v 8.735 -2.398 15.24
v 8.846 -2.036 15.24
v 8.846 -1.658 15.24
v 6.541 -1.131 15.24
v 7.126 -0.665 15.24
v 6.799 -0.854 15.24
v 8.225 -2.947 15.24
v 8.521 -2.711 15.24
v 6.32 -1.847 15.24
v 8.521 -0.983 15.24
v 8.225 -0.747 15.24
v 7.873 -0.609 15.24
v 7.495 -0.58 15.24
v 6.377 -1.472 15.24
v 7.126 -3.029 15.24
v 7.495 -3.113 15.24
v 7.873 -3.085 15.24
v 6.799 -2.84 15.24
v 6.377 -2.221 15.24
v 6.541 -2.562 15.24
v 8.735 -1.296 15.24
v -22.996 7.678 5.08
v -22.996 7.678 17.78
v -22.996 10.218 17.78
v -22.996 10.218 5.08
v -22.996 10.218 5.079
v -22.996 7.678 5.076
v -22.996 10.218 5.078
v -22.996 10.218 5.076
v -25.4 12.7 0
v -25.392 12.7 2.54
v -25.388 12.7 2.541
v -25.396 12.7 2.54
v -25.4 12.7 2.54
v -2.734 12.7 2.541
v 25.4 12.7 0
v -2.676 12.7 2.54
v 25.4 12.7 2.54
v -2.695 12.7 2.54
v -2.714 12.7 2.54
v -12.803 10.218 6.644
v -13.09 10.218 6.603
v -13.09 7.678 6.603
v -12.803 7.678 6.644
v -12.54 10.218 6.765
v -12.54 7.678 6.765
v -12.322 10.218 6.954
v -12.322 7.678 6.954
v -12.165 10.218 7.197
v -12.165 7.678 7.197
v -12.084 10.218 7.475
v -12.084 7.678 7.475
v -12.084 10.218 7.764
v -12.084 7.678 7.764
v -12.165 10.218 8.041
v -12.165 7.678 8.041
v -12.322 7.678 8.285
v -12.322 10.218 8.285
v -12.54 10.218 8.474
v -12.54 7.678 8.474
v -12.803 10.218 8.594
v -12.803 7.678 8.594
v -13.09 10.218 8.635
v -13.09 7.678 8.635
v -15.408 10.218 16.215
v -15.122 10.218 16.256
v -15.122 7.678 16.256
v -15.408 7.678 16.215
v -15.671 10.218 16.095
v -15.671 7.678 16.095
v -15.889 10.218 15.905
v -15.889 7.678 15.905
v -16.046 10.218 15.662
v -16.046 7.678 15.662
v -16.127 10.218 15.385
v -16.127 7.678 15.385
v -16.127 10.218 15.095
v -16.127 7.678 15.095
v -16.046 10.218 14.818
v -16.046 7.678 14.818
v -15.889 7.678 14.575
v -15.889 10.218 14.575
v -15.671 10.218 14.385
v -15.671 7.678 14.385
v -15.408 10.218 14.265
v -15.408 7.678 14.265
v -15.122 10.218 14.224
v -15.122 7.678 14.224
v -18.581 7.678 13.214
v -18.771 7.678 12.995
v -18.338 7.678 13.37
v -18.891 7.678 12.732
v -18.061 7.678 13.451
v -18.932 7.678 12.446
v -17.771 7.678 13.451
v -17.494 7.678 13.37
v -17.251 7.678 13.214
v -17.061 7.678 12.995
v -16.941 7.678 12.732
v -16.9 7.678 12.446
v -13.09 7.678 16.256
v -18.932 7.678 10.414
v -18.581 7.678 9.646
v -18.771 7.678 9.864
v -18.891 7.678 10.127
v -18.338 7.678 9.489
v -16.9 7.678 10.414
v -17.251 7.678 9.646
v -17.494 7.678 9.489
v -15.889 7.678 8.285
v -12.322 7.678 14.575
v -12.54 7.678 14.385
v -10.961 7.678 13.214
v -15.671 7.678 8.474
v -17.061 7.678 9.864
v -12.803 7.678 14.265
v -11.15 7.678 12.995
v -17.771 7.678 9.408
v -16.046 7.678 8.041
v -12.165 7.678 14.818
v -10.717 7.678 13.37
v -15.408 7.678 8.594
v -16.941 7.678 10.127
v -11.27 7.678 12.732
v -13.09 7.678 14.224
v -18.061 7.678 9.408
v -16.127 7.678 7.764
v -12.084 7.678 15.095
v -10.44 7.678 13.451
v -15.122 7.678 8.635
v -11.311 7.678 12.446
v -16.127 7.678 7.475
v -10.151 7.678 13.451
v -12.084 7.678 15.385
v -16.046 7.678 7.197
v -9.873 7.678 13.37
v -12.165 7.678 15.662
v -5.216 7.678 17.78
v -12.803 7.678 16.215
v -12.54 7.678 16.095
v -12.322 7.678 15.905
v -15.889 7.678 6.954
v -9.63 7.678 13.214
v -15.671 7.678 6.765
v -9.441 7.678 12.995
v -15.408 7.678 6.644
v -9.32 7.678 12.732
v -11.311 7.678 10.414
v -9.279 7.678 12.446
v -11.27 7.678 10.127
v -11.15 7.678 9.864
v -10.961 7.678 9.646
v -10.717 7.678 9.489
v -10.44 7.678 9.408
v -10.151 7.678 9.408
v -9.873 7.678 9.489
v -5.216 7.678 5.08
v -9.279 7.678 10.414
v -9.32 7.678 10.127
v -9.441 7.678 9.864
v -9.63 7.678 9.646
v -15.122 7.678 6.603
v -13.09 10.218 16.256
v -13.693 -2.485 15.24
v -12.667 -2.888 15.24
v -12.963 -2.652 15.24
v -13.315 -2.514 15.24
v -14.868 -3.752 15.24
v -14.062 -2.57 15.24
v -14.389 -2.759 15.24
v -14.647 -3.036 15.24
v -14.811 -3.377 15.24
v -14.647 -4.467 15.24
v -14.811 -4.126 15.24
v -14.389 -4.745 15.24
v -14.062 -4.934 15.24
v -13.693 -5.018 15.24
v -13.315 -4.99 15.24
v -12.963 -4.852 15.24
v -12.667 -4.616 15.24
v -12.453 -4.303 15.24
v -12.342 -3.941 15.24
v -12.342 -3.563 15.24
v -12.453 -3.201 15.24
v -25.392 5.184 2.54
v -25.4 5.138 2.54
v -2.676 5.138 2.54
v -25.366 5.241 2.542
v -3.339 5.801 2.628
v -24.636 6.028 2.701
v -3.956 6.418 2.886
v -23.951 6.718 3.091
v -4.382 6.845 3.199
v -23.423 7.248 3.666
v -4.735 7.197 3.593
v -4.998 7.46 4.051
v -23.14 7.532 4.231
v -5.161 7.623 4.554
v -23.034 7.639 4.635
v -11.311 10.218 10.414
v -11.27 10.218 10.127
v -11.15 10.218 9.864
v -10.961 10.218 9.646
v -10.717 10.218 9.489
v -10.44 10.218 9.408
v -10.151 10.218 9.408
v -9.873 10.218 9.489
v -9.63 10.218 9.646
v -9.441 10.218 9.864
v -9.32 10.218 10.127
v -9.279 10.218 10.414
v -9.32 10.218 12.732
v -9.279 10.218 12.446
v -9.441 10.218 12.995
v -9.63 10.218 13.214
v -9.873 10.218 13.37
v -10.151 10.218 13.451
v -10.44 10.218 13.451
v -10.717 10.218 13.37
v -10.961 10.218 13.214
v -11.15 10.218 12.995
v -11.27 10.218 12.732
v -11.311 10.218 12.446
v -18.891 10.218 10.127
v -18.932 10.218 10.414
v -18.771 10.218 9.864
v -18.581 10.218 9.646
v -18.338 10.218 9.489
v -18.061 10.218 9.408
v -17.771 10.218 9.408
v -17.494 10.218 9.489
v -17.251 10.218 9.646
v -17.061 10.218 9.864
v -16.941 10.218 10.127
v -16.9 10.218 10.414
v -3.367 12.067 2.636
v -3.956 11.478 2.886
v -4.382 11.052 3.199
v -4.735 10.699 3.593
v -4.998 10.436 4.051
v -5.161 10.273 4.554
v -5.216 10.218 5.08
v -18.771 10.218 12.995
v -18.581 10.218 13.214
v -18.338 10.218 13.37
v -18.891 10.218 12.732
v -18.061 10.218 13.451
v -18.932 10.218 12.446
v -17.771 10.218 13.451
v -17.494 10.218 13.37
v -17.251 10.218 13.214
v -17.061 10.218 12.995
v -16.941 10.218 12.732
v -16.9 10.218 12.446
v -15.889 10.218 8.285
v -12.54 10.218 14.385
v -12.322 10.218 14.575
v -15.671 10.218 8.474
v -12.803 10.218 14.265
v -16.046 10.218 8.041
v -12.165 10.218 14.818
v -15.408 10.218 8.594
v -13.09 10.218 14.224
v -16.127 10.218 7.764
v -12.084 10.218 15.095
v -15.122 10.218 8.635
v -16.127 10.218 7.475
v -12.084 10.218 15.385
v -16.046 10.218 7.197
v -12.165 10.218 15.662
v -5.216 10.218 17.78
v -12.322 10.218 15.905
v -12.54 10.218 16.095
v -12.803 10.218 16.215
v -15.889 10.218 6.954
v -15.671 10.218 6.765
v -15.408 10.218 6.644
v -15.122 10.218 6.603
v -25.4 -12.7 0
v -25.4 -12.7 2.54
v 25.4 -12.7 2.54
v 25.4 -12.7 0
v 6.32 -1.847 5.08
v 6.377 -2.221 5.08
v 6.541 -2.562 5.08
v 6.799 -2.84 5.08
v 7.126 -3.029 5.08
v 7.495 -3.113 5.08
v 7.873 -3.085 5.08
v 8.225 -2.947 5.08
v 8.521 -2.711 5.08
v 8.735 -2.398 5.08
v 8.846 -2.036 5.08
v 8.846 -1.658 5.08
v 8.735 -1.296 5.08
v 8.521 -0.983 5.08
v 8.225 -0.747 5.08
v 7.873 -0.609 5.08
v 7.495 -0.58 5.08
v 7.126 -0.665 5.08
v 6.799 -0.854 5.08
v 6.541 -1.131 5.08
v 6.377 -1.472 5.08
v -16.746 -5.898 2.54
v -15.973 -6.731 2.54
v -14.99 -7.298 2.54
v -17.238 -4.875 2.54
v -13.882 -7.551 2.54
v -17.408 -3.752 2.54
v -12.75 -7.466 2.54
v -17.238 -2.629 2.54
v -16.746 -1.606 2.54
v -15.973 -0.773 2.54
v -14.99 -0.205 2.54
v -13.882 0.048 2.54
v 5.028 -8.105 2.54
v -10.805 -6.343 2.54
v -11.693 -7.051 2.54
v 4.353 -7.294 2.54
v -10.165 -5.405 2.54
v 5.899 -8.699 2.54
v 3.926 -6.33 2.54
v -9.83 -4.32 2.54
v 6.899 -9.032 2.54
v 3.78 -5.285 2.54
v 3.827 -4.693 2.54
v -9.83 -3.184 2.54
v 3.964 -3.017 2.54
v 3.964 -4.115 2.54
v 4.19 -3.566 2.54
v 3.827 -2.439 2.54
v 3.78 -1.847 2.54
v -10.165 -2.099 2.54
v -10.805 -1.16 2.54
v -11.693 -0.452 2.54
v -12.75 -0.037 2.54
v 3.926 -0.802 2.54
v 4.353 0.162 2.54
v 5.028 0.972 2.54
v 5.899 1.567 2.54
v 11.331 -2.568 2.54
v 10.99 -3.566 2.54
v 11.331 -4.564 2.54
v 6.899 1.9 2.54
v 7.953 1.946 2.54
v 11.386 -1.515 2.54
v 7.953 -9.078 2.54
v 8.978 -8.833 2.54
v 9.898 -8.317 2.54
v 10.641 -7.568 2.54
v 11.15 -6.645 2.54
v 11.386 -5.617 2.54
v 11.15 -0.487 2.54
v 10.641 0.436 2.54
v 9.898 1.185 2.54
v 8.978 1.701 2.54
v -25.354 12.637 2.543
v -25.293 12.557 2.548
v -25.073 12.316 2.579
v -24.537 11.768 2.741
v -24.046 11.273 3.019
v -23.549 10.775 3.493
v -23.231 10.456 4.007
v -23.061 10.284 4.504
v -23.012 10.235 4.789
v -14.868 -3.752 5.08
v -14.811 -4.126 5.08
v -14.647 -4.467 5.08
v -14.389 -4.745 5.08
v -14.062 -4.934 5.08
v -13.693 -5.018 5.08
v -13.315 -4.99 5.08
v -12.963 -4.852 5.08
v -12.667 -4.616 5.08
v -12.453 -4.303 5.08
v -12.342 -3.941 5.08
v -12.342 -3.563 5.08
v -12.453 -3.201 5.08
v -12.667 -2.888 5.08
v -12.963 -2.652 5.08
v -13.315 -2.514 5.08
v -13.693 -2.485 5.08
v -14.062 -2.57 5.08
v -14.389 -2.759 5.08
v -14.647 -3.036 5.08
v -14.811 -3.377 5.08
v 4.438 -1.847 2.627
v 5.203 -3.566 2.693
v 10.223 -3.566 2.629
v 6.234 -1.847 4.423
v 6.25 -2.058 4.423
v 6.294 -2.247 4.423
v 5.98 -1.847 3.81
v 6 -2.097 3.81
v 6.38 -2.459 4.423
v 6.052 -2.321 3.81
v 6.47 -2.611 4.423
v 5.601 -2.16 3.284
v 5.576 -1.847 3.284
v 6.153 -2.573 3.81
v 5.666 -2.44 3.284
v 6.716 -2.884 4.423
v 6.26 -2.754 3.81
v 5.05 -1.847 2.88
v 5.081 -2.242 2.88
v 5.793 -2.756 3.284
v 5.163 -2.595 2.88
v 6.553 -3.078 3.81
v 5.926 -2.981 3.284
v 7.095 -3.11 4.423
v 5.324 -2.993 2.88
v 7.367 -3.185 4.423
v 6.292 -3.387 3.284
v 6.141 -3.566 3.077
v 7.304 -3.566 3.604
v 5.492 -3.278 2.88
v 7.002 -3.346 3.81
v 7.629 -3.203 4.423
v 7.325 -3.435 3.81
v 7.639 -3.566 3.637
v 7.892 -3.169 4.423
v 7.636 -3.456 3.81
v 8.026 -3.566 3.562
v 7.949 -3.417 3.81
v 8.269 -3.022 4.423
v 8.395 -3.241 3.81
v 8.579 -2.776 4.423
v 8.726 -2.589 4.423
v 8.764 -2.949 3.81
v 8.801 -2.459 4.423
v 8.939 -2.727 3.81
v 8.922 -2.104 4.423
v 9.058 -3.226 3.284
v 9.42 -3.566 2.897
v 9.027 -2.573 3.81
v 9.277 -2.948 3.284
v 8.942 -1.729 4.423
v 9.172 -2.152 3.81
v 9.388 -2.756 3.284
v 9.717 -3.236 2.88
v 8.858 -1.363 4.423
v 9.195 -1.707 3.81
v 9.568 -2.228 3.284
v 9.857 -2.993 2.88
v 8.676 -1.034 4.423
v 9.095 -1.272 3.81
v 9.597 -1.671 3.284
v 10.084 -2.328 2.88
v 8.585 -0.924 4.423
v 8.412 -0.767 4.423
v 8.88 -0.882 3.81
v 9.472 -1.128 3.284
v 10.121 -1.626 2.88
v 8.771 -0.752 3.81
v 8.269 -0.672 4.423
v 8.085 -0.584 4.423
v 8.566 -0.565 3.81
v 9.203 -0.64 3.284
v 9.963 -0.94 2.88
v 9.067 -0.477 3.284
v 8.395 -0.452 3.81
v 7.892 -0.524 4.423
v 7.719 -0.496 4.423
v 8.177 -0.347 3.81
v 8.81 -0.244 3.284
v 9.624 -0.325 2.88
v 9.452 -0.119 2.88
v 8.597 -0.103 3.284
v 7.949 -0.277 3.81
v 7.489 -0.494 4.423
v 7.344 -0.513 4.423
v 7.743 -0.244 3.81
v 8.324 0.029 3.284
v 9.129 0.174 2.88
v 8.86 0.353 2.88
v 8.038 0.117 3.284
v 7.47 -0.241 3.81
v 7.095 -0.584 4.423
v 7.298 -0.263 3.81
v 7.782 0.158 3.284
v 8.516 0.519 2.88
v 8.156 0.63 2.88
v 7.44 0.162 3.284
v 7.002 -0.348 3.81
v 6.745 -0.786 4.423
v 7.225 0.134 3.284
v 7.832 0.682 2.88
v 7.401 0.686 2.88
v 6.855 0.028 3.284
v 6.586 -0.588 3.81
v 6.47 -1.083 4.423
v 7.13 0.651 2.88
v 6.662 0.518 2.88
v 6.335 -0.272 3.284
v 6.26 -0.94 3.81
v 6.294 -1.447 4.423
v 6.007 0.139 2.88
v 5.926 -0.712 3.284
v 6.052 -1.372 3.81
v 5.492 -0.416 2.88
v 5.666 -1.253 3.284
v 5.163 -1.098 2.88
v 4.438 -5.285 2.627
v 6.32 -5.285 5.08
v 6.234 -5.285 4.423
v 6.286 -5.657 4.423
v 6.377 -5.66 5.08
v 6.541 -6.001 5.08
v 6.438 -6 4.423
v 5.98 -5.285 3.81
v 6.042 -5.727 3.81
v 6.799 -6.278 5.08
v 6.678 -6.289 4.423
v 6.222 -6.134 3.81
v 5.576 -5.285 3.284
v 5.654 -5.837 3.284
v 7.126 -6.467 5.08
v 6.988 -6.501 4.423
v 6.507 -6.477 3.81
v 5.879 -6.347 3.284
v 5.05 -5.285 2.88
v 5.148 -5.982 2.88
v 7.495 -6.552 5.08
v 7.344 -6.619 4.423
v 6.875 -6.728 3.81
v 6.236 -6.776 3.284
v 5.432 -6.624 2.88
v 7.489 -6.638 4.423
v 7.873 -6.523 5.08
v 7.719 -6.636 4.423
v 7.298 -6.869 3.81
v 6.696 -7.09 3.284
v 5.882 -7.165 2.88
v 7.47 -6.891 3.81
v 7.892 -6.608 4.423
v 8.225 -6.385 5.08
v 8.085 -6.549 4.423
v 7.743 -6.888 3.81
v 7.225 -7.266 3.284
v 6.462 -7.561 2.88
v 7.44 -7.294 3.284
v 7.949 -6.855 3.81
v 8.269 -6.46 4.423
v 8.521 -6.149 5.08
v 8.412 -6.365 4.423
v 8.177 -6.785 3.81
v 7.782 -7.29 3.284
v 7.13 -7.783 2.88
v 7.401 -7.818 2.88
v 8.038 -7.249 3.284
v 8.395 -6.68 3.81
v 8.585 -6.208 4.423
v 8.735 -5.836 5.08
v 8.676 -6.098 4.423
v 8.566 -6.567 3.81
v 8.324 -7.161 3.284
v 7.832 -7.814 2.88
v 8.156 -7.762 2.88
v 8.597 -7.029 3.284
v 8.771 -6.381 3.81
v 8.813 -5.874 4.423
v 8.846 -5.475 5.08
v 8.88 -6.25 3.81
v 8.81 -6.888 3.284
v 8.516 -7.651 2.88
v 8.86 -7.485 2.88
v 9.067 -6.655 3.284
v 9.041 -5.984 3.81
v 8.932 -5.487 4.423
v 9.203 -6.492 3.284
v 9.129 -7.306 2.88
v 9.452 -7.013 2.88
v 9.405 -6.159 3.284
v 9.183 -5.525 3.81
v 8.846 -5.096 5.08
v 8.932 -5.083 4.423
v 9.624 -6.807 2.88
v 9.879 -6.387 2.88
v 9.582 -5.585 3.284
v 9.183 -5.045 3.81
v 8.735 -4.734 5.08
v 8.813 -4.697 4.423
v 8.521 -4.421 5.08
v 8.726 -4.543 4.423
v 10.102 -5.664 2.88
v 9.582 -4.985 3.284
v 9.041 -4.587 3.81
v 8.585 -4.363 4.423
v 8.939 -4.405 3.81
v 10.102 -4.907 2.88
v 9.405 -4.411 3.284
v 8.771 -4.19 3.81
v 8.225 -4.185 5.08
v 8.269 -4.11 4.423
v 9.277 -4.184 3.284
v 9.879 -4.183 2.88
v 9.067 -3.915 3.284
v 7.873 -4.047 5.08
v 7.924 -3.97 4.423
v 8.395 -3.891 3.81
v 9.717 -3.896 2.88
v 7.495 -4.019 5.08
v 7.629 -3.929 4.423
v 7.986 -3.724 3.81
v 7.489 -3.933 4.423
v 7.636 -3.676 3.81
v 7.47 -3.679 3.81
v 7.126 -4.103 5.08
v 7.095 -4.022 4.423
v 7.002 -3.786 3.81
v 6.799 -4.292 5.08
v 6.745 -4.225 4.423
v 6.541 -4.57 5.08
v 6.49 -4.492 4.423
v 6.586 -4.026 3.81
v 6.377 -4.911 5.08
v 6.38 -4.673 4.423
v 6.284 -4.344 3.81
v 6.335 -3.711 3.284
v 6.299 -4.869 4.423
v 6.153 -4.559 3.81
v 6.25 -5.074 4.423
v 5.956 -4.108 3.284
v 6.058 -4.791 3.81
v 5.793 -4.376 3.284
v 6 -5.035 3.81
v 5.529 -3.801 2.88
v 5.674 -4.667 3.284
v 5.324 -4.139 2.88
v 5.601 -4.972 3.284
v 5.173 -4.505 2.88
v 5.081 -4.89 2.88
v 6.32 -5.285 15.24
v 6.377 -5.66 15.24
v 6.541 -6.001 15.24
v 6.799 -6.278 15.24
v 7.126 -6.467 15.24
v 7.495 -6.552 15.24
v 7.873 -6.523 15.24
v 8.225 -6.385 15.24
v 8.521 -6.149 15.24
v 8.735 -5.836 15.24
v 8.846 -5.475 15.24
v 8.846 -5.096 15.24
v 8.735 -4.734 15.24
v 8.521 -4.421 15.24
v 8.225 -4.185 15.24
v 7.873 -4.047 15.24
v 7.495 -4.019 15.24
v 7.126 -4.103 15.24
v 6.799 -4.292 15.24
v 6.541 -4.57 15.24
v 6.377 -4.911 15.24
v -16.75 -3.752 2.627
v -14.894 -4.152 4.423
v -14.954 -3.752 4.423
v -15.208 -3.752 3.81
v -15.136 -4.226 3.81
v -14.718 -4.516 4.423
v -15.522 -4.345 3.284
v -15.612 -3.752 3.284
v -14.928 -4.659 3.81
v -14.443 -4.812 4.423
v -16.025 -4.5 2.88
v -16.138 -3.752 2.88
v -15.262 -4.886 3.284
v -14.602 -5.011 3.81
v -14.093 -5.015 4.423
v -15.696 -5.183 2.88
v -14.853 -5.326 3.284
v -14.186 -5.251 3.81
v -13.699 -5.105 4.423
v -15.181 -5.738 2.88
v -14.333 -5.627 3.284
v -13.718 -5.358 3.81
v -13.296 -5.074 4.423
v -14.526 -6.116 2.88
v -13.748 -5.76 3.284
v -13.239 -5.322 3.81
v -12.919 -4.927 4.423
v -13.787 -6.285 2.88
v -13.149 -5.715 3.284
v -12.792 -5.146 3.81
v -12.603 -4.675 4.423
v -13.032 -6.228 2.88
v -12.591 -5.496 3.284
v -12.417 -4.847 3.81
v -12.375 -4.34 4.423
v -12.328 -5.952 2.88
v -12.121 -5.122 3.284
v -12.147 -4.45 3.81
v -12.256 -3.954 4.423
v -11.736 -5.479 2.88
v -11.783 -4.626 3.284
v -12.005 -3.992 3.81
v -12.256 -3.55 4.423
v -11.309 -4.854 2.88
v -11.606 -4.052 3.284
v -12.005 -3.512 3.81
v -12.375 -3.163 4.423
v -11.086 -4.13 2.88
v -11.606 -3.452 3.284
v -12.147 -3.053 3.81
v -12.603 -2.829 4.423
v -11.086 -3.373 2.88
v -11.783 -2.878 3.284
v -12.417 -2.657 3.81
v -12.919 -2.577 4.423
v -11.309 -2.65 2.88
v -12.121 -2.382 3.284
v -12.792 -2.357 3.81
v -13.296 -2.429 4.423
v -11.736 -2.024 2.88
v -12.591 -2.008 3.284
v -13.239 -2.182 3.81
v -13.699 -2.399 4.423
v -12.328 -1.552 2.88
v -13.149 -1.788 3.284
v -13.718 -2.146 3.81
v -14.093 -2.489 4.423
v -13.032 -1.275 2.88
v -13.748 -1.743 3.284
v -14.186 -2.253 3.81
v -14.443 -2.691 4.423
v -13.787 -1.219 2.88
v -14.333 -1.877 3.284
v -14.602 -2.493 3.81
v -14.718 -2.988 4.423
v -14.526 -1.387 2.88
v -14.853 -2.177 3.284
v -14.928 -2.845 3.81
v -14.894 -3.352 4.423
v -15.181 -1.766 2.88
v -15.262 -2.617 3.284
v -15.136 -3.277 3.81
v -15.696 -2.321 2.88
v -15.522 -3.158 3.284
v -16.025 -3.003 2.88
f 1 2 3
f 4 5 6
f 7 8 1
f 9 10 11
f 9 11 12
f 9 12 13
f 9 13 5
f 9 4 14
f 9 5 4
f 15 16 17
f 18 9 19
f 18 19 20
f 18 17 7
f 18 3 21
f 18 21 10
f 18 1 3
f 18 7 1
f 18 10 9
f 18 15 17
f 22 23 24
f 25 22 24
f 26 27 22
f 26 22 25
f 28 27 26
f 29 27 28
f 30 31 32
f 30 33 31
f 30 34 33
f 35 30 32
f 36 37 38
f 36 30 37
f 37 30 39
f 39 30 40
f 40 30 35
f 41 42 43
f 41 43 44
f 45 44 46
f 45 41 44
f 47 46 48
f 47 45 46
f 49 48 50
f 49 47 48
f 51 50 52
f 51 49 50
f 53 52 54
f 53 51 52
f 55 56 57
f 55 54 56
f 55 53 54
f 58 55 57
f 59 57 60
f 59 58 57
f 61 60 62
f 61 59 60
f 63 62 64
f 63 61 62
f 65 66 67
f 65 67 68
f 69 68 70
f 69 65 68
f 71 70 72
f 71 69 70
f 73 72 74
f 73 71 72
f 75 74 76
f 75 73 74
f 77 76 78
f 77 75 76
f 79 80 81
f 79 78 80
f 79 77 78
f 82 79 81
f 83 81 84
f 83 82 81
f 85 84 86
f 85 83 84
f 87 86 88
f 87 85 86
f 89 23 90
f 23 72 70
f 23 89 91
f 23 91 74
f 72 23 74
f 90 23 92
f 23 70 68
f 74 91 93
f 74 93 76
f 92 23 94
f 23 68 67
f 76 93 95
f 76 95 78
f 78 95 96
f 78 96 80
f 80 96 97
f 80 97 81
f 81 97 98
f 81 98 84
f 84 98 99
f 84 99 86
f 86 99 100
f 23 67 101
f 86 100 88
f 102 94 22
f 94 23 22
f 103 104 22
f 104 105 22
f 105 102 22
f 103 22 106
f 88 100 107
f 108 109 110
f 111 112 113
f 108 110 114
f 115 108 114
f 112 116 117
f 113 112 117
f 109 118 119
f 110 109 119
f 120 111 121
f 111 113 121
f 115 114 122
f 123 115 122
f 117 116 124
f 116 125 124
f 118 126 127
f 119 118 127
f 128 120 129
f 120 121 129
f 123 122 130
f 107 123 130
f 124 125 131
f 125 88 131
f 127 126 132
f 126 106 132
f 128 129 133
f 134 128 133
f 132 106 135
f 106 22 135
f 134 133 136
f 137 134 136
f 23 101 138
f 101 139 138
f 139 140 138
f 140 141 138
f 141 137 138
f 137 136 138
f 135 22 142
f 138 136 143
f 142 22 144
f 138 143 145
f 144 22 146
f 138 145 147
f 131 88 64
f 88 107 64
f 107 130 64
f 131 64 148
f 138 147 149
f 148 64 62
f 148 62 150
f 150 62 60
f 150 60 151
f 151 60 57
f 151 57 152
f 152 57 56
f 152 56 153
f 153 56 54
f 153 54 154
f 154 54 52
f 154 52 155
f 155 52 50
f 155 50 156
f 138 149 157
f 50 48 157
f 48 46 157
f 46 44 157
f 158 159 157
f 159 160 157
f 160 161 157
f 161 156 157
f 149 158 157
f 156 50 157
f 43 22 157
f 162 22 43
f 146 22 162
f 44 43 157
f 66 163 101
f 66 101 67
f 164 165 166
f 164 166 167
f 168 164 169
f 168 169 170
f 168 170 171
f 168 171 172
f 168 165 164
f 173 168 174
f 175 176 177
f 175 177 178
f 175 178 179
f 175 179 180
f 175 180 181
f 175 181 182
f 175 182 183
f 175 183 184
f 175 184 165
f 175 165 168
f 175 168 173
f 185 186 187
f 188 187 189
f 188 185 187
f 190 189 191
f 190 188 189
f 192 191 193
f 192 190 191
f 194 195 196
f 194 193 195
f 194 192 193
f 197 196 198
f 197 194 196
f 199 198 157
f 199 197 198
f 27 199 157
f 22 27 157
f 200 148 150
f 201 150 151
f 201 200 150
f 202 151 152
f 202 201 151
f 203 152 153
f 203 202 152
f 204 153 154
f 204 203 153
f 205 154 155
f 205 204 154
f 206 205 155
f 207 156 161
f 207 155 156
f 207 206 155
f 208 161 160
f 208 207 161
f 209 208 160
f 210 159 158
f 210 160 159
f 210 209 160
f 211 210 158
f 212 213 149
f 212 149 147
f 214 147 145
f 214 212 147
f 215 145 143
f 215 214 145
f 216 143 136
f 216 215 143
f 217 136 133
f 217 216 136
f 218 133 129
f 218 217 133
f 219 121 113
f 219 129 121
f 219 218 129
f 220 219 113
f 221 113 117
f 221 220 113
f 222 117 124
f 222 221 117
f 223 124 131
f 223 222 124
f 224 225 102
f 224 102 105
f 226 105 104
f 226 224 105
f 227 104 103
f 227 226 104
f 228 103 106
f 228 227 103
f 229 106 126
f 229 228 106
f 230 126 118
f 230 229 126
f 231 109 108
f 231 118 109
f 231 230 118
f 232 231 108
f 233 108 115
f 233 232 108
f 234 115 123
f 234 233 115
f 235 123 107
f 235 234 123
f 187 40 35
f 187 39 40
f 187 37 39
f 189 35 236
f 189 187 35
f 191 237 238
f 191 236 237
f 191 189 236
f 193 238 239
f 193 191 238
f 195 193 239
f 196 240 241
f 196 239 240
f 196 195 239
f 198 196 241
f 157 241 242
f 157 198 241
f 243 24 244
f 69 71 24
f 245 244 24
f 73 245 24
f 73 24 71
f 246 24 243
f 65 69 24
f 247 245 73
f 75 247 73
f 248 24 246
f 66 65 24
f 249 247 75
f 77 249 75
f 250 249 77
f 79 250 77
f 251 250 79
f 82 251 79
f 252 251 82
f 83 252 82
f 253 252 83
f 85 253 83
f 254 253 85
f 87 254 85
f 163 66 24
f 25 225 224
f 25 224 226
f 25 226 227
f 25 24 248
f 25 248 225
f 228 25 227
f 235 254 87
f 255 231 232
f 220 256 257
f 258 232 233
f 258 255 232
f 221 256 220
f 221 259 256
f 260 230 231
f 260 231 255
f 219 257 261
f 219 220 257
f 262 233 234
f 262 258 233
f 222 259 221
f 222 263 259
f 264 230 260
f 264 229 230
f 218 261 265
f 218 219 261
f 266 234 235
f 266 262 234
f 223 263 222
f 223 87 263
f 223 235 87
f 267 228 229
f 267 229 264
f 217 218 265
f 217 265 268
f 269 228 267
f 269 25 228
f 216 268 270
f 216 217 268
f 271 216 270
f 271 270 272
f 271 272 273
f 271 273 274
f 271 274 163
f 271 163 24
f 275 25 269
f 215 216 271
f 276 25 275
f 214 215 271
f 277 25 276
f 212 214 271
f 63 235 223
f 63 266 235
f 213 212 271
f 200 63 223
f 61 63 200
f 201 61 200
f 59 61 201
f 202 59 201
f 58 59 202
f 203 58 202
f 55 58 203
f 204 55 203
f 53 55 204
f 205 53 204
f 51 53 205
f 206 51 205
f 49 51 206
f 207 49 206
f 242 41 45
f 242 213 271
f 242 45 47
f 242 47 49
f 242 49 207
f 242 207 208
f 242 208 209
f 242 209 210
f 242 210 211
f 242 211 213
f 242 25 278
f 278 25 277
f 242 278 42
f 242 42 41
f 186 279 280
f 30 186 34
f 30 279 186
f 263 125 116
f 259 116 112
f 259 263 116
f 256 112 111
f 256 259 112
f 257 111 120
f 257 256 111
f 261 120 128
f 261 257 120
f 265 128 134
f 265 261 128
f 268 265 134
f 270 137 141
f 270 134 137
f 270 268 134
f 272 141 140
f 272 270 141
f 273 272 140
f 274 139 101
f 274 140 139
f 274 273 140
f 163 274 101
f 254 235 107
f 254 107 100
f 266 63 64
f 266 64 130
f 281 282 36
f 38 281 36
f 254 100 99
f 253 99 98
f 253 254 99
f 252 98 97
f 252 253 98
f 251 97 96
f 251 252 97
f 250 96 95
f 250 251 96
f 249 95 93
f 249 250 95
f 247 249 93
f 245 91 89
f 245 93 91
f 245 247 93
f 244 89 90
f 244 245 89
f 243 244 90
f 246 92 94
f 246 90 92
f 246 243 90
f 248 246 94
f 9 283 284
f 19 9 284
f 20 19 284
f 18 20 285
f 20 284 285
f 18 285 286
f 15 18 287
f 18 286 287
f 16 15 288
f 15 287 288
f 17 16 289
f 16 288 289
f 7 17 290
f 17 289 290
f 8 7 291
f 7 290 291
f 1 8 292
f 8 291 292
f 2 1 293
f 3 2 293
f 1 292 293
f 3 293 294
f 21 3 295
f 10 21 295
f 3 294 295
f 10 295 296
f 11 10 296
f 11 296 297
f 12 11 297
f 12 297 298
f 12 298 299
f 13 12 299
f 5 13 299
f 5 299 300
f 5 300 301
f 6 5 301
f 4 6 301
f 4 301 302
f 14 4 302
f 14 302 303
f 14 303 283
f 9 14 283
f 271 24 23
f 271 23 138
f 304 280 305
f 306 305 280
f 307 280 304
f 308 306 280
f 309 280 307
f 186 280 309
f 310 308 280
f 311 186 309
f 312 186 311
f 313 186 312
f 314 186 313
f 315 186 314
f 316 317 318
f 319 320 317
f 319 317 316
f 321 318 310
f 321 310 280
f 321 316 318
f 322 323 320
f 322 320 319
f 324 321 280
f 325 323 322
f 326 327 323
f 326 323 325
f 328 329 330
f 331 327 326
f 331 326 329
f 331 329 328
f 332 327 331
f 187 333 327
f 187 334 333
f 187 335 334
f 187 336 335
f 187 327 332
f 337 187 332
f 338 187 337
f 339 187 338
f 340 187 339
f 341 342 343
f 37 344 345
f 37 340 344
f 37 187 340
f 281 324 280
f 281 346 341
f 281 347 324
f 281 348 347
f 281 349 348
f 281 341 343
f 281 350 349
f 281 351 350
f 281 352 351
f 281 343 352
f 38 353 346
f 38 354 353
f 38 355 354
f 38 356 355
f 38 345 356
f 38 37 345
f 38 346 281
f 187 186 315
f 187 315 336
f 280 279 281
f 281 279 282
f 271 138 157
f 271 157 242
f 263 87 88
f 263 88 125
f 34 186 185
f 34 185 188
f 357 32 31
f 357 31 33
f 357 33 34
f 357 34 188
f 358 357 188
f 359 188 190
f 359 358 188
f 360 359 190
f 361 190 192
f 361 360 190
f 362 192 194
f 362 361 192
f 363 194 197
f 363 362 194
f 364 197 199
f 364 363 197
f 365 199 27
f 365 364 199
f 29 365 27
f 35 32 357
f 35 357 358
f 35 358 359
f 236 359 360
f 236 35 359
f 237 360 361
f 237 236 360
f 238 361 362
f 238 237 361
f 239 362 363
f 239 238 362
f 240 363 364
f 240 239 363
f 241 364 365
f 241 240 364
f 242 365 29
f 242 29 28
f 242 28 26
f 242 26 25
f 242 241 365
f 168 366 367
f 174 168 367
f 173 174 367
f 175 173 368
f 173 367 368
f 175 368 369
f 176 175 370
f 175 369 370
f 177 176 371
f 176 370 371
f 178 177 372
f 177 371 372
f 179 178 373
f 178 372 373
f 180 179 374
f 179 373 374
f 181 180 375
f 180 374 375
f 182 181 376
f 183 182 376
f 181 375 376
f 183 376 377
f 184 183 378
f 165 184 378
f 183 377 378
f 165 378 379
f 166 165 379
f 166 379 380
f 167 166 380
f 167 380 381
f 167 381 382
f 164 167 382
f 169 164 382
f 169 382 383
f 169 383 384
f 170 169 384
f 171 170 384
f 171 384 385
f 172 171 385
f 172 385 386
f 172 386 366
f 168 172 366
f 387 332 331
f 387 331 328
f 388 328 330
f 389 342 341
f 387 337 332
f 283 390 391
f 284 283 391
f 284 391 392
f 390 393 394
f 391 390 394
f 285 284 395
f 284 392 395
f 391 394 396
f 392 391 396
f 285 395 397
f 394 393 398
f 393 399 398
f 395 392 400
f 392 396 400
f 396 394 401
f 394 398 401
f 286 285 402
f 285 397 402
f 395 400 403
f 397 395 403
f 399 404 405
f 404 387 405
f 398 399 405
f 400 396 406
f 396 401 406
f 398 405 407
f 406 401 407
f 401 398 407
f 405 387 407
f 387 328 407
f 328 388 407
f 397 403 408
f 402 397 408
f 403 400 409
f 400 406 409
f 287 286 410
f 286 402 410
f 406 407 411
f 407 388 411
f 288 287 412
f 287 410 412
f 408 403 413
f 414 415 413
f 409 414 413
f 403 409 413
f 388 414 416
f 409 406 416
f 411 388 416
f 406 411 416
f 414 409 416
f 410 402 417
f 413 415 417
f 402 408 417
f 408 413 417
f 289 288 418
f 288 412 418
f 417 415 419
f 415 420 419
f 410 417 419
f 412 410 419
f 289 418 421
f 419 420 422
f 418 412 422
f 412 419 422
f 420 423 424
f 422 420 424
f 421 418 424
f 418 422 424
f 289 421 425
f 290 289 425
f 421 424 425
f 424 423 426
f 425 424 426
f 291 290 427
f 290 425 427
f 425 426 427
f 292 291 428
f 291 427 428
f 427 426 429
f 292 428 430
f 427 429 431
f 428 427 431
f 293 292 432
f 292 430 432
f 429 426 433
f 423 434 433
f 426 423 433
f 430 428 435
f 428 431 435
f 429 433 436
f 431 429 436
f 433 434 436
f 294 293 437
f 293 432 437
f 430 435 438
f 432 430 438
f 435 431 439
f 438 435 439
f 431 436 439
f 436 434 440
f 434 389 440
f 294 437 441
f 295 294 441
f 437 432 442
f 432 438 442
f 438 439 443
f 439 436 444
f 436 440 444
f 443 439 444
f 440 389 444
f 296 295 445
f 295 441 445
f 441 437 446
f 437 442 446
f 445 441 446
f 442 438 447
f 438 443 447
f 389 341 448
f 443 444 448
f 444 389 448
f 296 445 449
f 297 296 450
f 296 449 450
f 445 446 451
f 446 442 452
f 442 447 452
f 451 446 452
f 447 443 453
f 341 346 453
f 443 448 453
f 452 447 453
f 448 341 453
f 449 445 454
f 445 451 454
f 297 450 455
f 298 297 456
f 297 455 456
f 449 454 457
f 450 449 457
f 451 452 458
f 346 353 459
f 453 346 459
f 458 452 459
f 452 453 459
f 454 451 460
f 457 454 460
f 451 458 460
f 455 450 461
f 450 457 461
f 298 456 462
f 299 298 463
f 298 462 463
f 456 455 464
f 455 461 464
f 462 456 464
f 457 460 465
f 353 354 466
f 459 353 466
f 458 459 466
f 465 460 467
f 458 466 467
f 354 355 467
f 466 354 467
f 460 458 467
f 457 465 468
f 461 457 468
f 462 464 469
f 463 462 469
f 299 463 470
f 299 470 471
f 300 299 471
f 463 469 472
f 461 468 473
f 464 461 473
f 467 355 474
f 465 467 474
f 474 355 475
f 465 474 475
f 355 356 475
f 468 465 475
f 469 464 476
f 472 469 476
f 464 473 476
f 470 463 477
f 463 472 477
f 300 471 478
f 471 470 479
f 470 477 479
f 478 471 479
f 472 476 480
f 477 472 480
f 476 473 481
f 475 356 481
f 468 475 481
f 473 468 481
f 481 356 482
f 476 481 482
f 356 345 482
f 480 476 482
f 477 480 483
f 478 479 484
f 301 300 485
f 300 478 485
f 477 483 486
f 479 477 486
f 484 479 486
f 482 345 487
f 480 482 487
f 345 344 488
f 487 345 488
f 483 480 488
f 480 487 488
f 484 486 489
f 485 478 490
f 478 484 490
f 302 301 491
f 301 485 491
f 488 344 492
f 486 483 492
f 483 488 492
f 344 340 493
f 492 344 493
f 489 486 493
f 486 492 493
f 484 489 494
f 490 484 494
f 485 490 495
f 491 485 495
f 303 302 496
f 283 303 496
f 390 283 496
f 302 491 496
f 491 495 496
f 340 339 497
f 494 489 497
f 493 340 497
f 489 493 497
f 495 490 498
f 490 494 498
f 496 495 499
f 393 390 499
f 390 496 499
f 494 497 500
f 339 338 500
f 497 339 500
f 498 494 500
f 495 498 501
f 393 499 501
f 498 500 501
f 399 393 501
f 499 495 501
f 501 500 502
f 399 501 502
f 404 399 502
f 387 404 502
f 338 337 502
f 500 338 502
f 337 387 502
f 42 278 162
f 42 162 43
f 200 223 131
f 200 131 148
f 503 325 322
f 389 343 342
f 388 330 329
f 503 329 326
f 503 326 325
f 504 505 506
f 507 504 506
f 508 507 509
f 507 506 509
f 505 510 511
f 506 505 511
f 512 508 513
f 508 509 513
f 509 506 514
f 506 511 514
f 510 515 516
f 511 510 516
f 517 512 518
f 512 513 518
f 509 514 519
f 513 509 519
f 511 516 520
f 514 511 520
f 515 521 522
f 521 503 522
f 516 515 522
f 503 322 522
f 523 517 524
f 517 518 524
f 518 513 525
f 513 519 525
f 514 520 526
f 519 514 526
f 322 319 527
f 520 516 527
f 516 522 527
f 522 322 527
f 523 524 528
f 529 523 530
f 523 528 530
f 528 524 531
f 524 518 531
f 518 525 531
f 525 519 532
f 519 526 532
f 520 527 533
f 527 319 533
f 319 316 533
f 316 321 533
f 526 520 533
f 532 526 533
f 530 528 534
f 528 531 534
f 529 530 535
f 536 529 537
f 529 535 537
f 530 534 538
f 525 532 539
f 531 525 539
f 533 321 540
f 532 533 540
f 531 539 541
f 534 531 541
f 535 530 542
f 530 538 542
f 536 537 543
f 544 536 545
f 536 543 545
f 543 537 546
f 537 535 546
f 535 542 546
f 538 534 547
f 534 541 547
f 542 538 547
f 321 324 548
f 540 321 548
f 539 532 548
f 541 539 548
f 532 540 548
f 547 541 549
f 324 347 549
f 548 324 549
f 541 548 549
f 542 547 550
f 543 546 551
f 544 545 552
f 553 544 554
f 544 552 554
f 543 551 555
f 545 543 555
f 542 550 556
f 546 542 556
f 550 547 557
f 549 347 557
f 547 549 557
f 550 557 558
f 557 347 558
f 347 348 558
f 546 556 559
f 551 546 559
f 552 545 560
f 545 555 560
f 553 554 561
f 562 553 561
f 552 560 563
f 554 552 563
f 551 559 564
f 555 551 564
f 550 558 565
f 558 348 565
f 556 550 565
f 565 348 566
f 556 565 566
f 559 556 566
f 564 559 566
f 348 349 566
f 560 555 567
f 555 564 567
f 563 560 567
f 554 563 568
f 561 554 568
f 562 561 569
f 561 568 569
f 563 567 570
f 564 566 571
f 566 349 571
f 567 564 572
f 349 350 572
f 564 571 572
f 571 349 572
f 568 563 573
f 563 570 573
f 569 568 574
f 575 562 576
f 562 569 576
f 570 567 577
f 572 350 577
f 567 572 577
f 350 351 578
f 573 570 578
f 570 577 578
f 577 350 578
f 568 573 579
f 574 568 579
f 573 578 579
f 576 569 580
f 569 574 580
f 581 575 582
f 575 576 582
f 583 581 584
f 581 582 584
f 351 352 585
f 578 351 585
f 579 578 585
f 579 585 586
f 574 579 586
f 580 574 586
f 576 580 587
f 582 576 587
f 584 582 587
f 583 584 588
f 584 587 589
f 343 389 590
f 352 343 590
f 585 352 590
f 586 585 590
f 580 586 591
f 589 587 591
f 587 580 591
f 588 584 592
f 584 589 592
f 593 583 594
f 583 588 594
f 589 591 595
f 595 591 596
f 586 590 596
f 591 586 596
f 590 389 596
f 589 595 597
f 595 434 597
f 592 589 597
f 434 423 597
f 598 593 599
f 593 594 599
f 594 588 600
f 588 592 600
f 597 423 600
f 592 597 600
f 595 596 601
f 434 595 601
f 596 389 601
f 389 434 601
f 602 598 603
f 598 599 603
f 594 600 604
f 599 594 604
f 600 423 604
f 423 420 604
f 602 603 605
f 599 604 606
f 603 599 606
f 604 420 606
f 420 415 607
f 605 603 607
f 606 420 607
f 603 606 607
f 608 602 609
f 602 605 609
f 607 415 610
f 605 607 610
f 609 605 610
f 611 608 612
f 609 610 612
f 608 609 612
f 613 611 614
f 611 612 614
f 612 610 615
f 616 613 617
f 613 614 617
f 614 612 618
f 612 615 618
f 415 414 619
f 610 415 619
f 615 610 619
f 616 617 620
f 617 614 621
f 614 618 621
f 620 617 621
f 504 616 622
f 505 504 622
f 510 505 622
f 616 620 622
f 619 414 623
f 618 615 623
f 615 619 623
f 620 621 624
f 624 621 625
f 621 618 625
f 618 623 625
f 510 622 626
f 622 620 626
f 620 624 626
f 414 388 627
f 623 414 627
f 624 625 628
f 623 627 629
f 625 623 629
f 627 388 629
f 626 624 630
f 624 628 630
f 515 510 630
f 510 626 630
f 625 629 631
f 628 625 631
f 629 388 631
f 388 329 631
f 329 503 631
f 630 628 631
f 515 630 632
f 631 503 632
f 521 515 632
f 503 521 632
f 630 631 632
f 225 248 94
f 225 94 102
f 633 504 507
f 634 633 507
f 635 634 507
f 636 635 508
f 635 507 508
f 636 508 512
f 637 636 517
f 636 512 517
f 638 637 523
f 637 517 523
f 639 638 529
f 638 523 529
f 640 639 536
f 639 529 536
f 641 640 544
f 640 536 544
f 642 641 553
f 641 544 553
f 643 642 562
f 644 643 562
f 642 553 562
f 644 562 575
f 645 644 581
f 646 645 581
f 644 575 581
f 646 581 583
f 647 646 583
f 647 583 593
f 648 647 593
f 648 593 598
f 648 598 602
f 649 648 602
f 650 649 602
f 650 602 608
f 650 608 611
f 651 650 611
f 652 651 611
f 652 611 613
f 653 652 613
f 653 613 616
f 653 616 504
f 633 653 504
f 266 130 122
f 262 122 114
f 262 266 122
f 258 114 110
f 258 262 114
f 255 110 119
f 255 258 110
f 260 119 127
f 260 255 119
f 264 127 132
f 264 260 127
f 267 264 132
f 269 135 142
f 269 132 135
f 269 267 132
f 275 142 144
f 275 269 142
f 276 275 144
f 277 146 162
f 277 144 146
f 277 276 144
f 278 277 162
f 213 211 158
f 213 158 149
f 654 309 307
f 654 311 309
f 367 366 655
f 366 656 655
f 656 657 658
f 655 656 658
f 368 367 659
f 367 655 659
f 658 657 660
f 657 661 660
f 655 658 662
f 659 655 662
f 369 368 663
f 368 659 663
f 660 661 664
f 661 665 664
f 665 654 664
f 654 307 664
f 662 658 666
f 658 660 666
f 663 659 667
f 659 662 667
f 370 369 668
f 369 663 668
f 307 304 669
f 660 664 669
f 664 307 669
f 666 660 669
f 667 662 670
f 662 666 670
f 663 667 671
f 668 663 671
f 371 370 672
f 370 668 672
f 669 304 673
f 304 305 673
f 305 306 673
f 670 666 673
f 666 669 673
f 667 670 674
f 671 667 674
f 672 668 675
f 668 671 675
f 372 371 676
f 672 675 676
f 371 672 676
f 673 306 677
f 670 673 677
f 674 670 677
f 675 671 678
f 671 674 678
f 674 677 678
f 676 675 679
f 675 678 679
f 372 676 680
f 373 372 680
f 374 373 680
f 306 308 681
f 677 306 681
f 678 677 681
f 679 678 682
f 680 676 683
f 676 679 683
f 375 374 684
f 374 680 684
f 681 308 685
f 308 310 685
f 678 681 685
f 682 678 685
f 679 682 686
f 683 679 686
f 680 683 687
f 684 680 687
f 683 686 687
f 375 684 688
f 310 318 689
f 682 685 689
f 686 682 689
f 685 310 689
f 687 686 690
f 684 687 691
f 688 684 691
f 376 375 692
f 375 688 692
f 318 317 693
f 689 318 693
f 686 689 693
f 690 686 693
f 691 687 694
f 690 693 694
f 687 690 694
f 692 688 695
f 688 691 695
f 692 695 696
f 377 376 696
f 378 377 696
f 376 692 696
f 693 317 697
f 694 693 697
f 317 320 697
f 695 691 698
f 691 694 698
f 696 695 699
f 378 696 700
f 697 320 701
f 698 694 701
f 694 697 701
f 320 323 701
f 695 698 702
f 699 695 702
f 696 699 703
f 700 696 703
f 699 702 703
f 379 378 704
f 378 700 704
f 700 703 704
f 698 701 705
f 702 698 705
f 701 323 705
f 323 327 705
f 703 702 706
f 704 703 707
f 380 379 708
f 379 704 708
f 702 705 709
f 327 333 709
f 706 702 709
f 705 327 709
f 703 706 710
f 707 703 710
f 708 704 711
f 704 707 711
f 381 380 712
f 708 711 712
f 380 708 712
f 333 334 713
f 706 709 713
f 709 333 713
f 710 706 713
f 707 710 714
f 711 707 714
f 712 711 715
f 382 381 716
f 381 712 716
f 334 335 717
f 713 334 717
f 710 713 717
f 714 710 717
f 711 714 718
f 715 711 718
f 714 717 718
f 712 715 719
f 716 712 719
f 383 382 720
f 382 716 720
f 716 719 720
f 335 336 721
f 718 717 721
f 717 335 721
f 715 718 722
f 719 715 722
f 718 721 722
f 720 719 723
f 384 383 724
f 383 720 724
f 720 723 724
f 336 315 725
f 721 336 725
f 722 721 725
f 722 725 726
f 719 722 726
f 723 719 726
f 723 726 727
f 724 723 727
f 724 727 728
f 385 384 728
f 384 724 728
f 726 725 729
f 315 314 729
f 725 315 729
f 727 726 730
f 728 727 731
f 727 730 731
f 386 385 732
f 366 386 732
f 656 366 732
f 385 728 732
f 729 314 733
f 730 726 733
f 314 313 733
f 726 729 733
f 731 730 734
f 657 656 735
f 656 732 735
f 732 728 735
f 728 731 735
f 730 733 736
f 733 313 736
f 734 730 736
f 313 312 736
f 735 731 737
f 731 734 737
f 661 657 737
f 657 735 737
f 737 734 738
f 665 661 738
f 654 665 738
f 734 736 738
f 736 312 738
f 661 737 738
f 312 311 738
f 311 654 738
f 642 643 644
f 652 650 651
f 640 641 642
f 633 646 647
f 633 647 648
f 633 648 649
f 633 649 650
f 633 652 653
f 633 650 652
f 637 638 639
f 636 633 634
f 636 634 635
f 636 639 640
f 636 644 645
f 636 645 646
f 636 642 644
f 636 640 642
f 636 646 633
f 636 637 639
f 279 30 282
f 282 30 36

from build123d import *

# Parameters (mm, degrees)
SKETCH1_W                 = 50.8
SKETCH1_H                 = 25.4
BASE_DEPTH                = 2.54
SKETCH2_R                 = 1.27
GUIDEPOSTS_DEPTH          = 12.7
SKETCH3_W                 = 17.78
SKETCH3_H                 = 2.54
BUTTON_HOLDER_DEPTH       = 15.24
ROUND_ON_BUTTON_HOLDER_R  = 2.54
ONE_BUTTON_LEG_HOLE_REACH = 40.556
BUTTON_LEG_HOLES_COUNT    = 4


with BuildPart() as part:
    # Sketch1 → base (new body)
    with BuildSketch(Plane.XY):
        Rectangle(SKETCH1_W, SKETCH1_H)
    extrude(amount=BASE_DEPTH)

    # Sketch2 → guideposts (add)
    with BuildSketch(Plane.XY.offset(2.54)):
        with Locations(Location((7.590347968, -1.846813132, 0), (0, 0, 180))):
            Circle(SKETCH2_R)
        with Locations(Location((7.590347968, -5.285256746, 0), (0, 0, 180))):
            Circle(SKETCH2_R)
        with Locations(Location((-13.597624432, -3.751813132, 0), (0, 0, 180))):
            Circle(SKETCH2_R)
    extrude(amount=GUIDEPOSTS_DEPTH)

    # Sketch3 → button holder (add)
    with BuildSketch(Plane.XY.offset(2.54)):
        with Locations((-14.105624432, 8.948186868)):
            Rectangle(SKETCH3_W, SKETCH3_H)
    extrude(amount=BUTTON_HOLDER_DEPTH)

    # round on button holder
    # the kernel refuses this fillet: 2.54 mm, written as the material it adds along each edge
    with BuildSketch(Plane(origin=(7.590347968, -1.846813132, 2.54), x_dir=(-1, 0, 0), z_dir=(0, 1, 0))) as round_on_button_holder_piece_1:
        with BuildLine():
            CenterArc((1.27 + ROUND_ON_BUTTON_HOLDER_R, ROUND_ON_BUTTON_HOLDER_R), ROUND_ON_BUTTON_HOLDER_R, 180, 90)
            Line((1.27, ROUND_ON_BUTTON_HOLDER_R), (1.27, 0))
            Line((1.27, 0), (1.27 + ROUND_ON_BUTTON_HOLDER_R, 0))
        make_face()
    round_on_button_holder_piece_1_solid = revolve(axis=Axis((7.590347968, -1.846813132, 2.54), (0, 0, 1)), mode=Mode.PRIVATE)
    with BuildSketch(Plane(origin=(7.590347968, -5.285256746, 2.54), x_dir=(-1, 0, 0), z_dir=(0, 1, 0))) as round_on_button_holder_piece_2:
        with BuildLine():
            CenterArc((1.27 + ROUND_ON_BUTTON_HOLDER_R, ROUND_ON_BUTTON_HOLDER_R), ROUND_ON_BUTTON_HOLDER_R, 180, 90)
            Line((1.27, ROUND_ON_BUTTON_HOLDER_R), (1.27, 0))
            Line((1.27, 0), (1.27 + ROUND_ON_BUTTON_HOLDER_R, 0))
        make_face()
    round_on_button_holder_piece_2_solid = revolve(axis=Axis((7.590347968, -5.285256746, 2.54), (0, 0, 1)), mode=Mode.PRIVATE)
    with BuildSketch(Plane(origin=(-13.597624432, -3.751813132, 2.54), x_dir=(-1, 0, 0), z_dir=(0, 1, 0))) as round_on_button_holder_piece_3:
        with BuildLine():
            CenterArc((1.27 + ROUND_ON_BUTTON_HOLDER_R, ROUND_ON_BUTTON_HOLDER_R), ROUND_ON_BUTTON_HOLDER_R, 180, 90)
            Line((1.27, ROUND_ON_BUTTON_HOLDER_R), (1.27, 0))
            Line((1.27, 0), (1.27 + ROUND_ON_BUTTON_HOLDER_R, 0))
        make_face()
    round_on_button_holder_piece_3_solid = revolve(axis=Axis((-13.597624432, -3.751813132, 2.54), (0, 0, 1)), mode=Mode.PRIVATE)
    with BuildSketch(Plane(origin=(-5.215624432, 7.678186868, 2.54), x_dir=(1, 0, 0), z_dir=(0, 1, 0))) as round_on_button_holder_piece_4:
        with BuildLine():
            CenterArc((ROUND_ON_BUTTON_HOLDER_R, -ROUND_ON_BUTTON_HOLDER_R), ROUND_ON_BUTTON_HOLDER_R, 90, 90)
            Line((0, -ROUND_ON_BUTTON_HOLDER_R), (0, 0))
            Line((0, 0), (ROUND_ON_BUTTON_HOLDER_R, 0))
        make_face()
    round_on_button_holder_piece_4_solid = extrude(amount=2.54, mode=Mode.PRIVATE)
    with BuildSketch(Plane(origin=(-5.215624432, 10.218186868, 2.54), x_dir=(0, 1, 0), z_dir=(-1, 0, 0))) as round_on_button_holder_piece_5_section:
        with BuildLine():
            CenterArc((ROUND_ON_BUTTON_HOLDER_R, -ROUND_ON_BUTTON_HOLDER_R), ROUND_ON_BUTTON_HOLDER_R, 90, 90)
            Line((0, -ROUND_ON_BUTTON_HOLDER_R), (0, 0))
            Line((0, 0), (ROUND_ON_BUTTON_HOLDER_R, 0))
        make_face()
    round_on_button_holder_piece_5 = extrude(amount=17.78, mode=Mode.PRIVATE)
    round_on_button_holder_piece_5 = split(round_on_button_holder_piece_5, bisect_by=Plane(origin=(-5.215624432, 12.7, 2.54), z_dir=(0, -1, 0)), keep=Keep.TOP, mode=Mode.PRIVATE)
    with BuildSketch(Plane(origin=(-22.995624432, 10.218186868, 2.54), x_dir=(-1, 0, 0), z_dir=(0, -1, 0))) as round_on_button_holder_piece_6:
        with BuildLine():
            CenterArc((2.54, -2.536376552), ROUND_ON_BUTTON_HOLDER_R, 93.060789284, 86.939210716)
            Line((0, -2.536376552), (0, 0))
            Line((0, 0), (2.404375568, 0))
        make_face()
    round_on_button_holder_piece_6_solid = extrude(amount=2.54, mode=Mode.PRIVATE)
    with BuildSketch(Plane(origin=(-22.995624432, 7.678186868, 2.54), x_dir=(0, -1, 0), z_dir=(1, 0, 0))) as round_on_button_holder_piece_7:
        with BuildLine():
            CenterArc((ROUND_ON_BUTTON_HOLDER_R, -ROUND_ON_BUTTON_HOLDER_R), ROUND_ON_BUTTON_HOLDER_R, 90, 90)
            Line((0, -ROUND_ON_BUTTON_HOLDER_R), (0, 0))
            Line((0, 0), (ROUND_ON_BUTTON_HOLDER_R, 0))
        make_face()
    round_on_button_holder_piece_7_solid = extrude(amount=17.78, mode=Mode.PRIVATE)
    with BuildSketch(Plane(origin=(-22.995624432, 7.678186868, 2.54), x_dir=(0, -1, 0), z_dir=(1, 0, 0))) as round_on_button_holder_piece_8a_section:
        with BuildLine():
            CenterArc((ROUND_ON_BUTTON_HOLDER_R, -ROUND_ON_BUTTON_HOLDER_R), ROUND_ON_BUTTON_HOLDER_R, 90, 90)
            Line((0, -ROUND_ON_BUTTON_HOLDER_R), (0, 0))
            Line((0, 0), (ROUND_ON_BUTTON_HOLDER_R, 0))
        make_face()
    round_on_button_holder_piece_8a = extrude(amount=24.13, mode=Mode.PRIVATE)
    round_on_button_holder_piece_8a = split(round_on_button_holder_piece_8a, bisect_by=Plane(origin=(-5.215624432, 7.678186868, 2.54), z_dir=(1, 0, 0)), keep=Keep.TOP, mode=Mode.PRIVATE)
    with BuildSketch(Plane(origin=(-5.215624432, 1.328186868, 2.54), x_dir=(1, 0, 0), z_dir=(0, 1, 0))) as round_on_button_holder_piece_8b_section:
        with BuildLine():
            CenterArc((ROUND_ON_BUTTON_HOLDER_R, -ROUND_ON_BUTTON_HOLDER_R), ROUND_ON_BUTTON_HOLDER_R, 90, 90)
            Line((0, -ROUND_ON_BUTTON_HOLDER_R), (0, 0))
            Line((0, 0), (ROUND_ON_BUTTON_HOLDER_R, 0))
        make_face()
    round_on_button_holder_piece_8b = extrude(amount=8.89, mode=Mode.PRIVATE)
    round_on_button_holder_piece_8b = split(round_on_button_holder_piece_8b, bisect_by=Plane(origin=(-5.215624432, 7.678186868, 2.54), z_dir=(0, -1, 0)), keep=Keep.TOP, mode=Mode.PRIVATE)
    round_on_button_holder_piece_8 = round_on_button_holder_piece_8a & round_on_button_holder_piece_8b
    with BuildSketch(Plane(origin=(-5.215624432, 7.678186868, 2.54), x_dir=(1, 0, 0), z_dir=(0, 1, 0))) as round_on_button_holder_piece_9a_section:
        with BuildLine():
            CenterArc((ROUND_ON_BUTTON_HOLDER_R, -ROUND_ON_BUTTON_HOLDER_R), ROUND_ON_BUTTON_HOLDER_R, 90, 90)
            Line((0, -ROUND_ON_BUTTON_HOLDER_R), (0, 0))
            Line((0, 0), (ROUND_ON_BUTTON_HOLDER_R, 0))
        make_face()
    round_on_button_holder_piece_9a = extrude(amount=8.89, mode=Mode.PRIVATE)
    round_on_button_holder_piece_9a = split(round_on_button_holder_piece_9a, bisect_by=Plane(origin=(-5.215624432, 12.7, 2.54), z_dir=(0, -1, 0)), keep=Keep.TOP, mode=Mode.PRIVATE)
    round_on_button_holder_piece_9a = split(round_on_button_holder_piece_9a, bisect_by=Plane(origin=(-5.215624432, 10.218186868, 2.54), z_dir=(0, 1, 0)), keep=Keep.TOP, mode=Mode.PRIVATE)
    with BuildSketch(Plane(origin=(1.134375568, 10.218186868, 2.54), x_dir=(0, 1, 0), z_dir=(-1, 0, 0))) as round_on_button_holder_piece_9b_section:
        with BuildLine():
            CenterArc((ROUND_ON_BUTTON_HOLDER_R, -ROUND_ON_BUTTON_HOLDER_R), ROUND_ON_BUTTON_HOLDER_R, 90, 90)
            Line((0, -ROUND_ON_BUTTON_HOLDER_R), (0, 0))
            Line((0, 0), (ROUND_ON_BUTTON_HOLDER_R, 0))
        make_face()
    round_on_button_holder_piece_9b = extrude(amount=24.13, mode=Mode.PRIVATE)
    round_on_button_holder_piece_9b = split(round_on_button_holder_piece_9b, bisect_by=Plane(origin=(-5.215624432, 10.218186868, 2.54), z_dir=(1, 0, 0)), keep=Keep.TOP, mode=Mode.PRIVATE)
    round_on_button_holder_piece_9 = round_on_button_holder_piece_9a & round_on_button_holder_piece_9b
    with BuildSketch(Plane(origin=(-5.215624432, 10.218186868, 2.54), x_dir=(0, 1, 0), z_dir=(-1, 0, 0))) as round_on_button_holder_piece_10a_section:
        with BuildLine():
            CenterArc((ROUND_ON_BUTTON_HOLDER_R, -ROUND_ON_BUTTON_HOLDER_R), ROUND_ON_BUTTON_HOLDER_R, 90, 90)
            Line((0, -ROUND_ON_BUTTON_HOLDER_R), (0, 0))
            Line((0, 0), (ROUND_ON_BUTTON_HOLDER_R, 0))
        make_face()
    round_on_button_holder_piece_10a = extrude(amount=24.13, mode=Mode.PRIVATE)
    round_on_button_holder_piece_10a = split(round_on_button_holder_piece_10a, bisect_by=Plane(origin=(-25.4, 10.218186868, 2.54), z_dir=(1, 0, 0)), keep=Keep.TOP, mode=Mode.PRIVATE)
    round_on_button_holder_piece_10a = split(round_on_button_holder_piece_10a, bisect_by=Plane(origin=(-22.995624432, 10.218186868, 2.54), z_dir=(-1, 0, 0)), keep=Keep.TOP, mode=Mode.PRIVATE)
    with BuildSketch(Plane(origin=(-22.995624432, 16.559128248, 2.54), x_dir=(-1, 0, 0), z_dir=(0, -1, 0))) as round_on_button_holder_piece_10b_section:
        with BuildLine():
            CenterArc((2.54, -2.536376552), ROUND_ON_BUTTON_HOLDER_R, 93.060789284, 86.939210716)
            Line((0, -2.536376552), (0, 0))
            Line((0, 0), (2.404375568, 0))
        make_face()
    round_on_button_holder_piece_10b = extrude(amount=8.88094138, mode=Mode.PRIVATE)
    round_on_button_holder_piece_10b = split(round_on_button_holder_piece_10b, bisect_by=Plane(origin=(-22.995624432, 12.7, 2.54), z_dir=(0, -1, 0)), keep=Keep.TOP, mode=Mode.PRIVATE)
    round_on_button_holder_piece_10b = split(round_on_button_holder_piece_10b, bisect_by=Plane(origin=(-22.995624432, 10.218186868, 2.54), z_dir=(0, 1, 0)), keep=Keep.TOP, mode=Mode.PRIVATE)
    round_on_button_holder_piece_10 = round_on_button_holder_piece_10a & round_on_button_holder_piece_10b
    with BuildSketch(Plane(origin=(-29.345624432, 7.678186868, 2.54), x_dir=(0, -1, 0), z_dir=(1, 0, 0))) as round_on_button_holder_piece_11a_section:
        with BuildLine():
            CenterArc((ROUND_ON_BUTTON_HOLDER_R, -ROUND_ON_BUTTON_HOLDER_R), ROUND_ON_BUTTON_HOLDER_R, 90, 90)
            Line((0, -ROUND_ON_BUTTON_HOLDER_R), (0, 0))
            Line((0, 0), (ROUND_ON_BUTTON_HOLDER_R, 0))
        make_face()
    round_on_button_holder_piece_11a = extrude(amount=24.13, mode=Mode.PRIVATE)
    round_on_button_holder_piece_11a = split(round_on_button_holder_piece_11a, bisect_by=Plane(origin=(-25.4, 7.678186868, 2.54), z_dir=(1, 0, 0)), keep=Keep.TOP, mode=Mode.PRIVATE)
    round_on_button_holder_piece_11a = split(round_on_button_holder_piece_11a, bisect_by=Plane(origin=(-22.995624432, 7.678186868, 2.54), z_dir=(-1, 0, 0)), keep=Keep.TOP, mode=Mode.PRIVATE)
    with BuildSketch(Plane(origin=(-22.995624432, 10.218186868, 2.54), x_dir=(-1, 0, 0), z_dir=(0, -1, 0))) as round_on_button_holder_piece_11b_section:
        with BuildLine():
            CenterArc((2.54, -2.536376552), ROUND_ON_BUTTON_HOLDER_R, 93.060789284, 86.939210716)
            Line((0, -2.536376552), (0, 0))
            Line((0, 0), (2.404375568, 0))
        make_face()
    round_on_button_holder_piece_11b = extrude(amount=8.88094138, mode=Mode.PRIVATE)
    round_on_button_holder_piece_11b = split(round_on_button_holder_piece_11b, bisect_by=Plane(origin=(-22.995624432, 7.678186868, 2.54), z_dir=(0, -1, 0)), keep=Keep.TOP, mode=Mode.PRIVATE)
    round_on_button_holder_piece_11 = round_on_button_holder_piece_11a & round_on_button_holder_piece_11b
    add([round_on_button_holder_piece_1_solid, round_on_button_holder_piece_2_solid, round_on_button_holder_piece_3_solid, round_on_button_holder_piece_4_solid, round_on_button_holder_piece_5, round_on_button_holder_piece_6_solid, round_on_button_holder_piece_7_solid, round_on_button_holder_piece_8, round_on_button_holder_piece_9, round_on_button_holder_piece_10, round_on_button_holder_piece_11])

    # Sketch4 → one button leg hole (cut, up to next)
    with BuildSketch(Plane(origin=(0, 10.218186868, 0), x_dir=(1, 0, 0), z_dir=(0, 1, 0)), mode=Mode.PRIVATE) as one_button_leg_hole_sk1:
        with BuildLine():
            Line((-15.121624432, -14.224), (-13.089624432, -14.224))
            ThreePointArc((-13.089624432, -14.224), (-12.073624432, -15.24), (-13.089624432, -16.256))
            Line((-13.089624432, -16.256), (-15.121624432, -16.256))
            ThreePointArc((-15.121624432, -16.256), (-16.137624432, -15.24), (-15.121624432, -14.224))
        make_face()
    one_button_leg_hole_tool1 = extrude(one_button_leg_hole_sk1.sketch, amount=-ONE_BUTTON_LEG_HOLE_REACH, mode=Mode.PRIVATE) & part.part
    one_button_leg_hole = one_button_leg_hole_tool1.solids().sort_by_distance((-14.105624, 10.218187, 15.24))[0]
    add(one_button_leg_hole, mode=Mode.SUBTRACT)

    # button leg holes: one button leg hole ×4 about axis
    button_leg_holes_axis = Axis((-14.105624476, 0, 11.429666717), (0, 1, 0))
    for i in range(1, BUTTON_LEG_HOLES_COUNT):
        add(one_button_leg_hole.rotate(button_leg_holes_axis, i * 360 / BUTTON_LEG_HOLES_COUNT), mode=Mode.SUBTRACT)


solid = part.part
